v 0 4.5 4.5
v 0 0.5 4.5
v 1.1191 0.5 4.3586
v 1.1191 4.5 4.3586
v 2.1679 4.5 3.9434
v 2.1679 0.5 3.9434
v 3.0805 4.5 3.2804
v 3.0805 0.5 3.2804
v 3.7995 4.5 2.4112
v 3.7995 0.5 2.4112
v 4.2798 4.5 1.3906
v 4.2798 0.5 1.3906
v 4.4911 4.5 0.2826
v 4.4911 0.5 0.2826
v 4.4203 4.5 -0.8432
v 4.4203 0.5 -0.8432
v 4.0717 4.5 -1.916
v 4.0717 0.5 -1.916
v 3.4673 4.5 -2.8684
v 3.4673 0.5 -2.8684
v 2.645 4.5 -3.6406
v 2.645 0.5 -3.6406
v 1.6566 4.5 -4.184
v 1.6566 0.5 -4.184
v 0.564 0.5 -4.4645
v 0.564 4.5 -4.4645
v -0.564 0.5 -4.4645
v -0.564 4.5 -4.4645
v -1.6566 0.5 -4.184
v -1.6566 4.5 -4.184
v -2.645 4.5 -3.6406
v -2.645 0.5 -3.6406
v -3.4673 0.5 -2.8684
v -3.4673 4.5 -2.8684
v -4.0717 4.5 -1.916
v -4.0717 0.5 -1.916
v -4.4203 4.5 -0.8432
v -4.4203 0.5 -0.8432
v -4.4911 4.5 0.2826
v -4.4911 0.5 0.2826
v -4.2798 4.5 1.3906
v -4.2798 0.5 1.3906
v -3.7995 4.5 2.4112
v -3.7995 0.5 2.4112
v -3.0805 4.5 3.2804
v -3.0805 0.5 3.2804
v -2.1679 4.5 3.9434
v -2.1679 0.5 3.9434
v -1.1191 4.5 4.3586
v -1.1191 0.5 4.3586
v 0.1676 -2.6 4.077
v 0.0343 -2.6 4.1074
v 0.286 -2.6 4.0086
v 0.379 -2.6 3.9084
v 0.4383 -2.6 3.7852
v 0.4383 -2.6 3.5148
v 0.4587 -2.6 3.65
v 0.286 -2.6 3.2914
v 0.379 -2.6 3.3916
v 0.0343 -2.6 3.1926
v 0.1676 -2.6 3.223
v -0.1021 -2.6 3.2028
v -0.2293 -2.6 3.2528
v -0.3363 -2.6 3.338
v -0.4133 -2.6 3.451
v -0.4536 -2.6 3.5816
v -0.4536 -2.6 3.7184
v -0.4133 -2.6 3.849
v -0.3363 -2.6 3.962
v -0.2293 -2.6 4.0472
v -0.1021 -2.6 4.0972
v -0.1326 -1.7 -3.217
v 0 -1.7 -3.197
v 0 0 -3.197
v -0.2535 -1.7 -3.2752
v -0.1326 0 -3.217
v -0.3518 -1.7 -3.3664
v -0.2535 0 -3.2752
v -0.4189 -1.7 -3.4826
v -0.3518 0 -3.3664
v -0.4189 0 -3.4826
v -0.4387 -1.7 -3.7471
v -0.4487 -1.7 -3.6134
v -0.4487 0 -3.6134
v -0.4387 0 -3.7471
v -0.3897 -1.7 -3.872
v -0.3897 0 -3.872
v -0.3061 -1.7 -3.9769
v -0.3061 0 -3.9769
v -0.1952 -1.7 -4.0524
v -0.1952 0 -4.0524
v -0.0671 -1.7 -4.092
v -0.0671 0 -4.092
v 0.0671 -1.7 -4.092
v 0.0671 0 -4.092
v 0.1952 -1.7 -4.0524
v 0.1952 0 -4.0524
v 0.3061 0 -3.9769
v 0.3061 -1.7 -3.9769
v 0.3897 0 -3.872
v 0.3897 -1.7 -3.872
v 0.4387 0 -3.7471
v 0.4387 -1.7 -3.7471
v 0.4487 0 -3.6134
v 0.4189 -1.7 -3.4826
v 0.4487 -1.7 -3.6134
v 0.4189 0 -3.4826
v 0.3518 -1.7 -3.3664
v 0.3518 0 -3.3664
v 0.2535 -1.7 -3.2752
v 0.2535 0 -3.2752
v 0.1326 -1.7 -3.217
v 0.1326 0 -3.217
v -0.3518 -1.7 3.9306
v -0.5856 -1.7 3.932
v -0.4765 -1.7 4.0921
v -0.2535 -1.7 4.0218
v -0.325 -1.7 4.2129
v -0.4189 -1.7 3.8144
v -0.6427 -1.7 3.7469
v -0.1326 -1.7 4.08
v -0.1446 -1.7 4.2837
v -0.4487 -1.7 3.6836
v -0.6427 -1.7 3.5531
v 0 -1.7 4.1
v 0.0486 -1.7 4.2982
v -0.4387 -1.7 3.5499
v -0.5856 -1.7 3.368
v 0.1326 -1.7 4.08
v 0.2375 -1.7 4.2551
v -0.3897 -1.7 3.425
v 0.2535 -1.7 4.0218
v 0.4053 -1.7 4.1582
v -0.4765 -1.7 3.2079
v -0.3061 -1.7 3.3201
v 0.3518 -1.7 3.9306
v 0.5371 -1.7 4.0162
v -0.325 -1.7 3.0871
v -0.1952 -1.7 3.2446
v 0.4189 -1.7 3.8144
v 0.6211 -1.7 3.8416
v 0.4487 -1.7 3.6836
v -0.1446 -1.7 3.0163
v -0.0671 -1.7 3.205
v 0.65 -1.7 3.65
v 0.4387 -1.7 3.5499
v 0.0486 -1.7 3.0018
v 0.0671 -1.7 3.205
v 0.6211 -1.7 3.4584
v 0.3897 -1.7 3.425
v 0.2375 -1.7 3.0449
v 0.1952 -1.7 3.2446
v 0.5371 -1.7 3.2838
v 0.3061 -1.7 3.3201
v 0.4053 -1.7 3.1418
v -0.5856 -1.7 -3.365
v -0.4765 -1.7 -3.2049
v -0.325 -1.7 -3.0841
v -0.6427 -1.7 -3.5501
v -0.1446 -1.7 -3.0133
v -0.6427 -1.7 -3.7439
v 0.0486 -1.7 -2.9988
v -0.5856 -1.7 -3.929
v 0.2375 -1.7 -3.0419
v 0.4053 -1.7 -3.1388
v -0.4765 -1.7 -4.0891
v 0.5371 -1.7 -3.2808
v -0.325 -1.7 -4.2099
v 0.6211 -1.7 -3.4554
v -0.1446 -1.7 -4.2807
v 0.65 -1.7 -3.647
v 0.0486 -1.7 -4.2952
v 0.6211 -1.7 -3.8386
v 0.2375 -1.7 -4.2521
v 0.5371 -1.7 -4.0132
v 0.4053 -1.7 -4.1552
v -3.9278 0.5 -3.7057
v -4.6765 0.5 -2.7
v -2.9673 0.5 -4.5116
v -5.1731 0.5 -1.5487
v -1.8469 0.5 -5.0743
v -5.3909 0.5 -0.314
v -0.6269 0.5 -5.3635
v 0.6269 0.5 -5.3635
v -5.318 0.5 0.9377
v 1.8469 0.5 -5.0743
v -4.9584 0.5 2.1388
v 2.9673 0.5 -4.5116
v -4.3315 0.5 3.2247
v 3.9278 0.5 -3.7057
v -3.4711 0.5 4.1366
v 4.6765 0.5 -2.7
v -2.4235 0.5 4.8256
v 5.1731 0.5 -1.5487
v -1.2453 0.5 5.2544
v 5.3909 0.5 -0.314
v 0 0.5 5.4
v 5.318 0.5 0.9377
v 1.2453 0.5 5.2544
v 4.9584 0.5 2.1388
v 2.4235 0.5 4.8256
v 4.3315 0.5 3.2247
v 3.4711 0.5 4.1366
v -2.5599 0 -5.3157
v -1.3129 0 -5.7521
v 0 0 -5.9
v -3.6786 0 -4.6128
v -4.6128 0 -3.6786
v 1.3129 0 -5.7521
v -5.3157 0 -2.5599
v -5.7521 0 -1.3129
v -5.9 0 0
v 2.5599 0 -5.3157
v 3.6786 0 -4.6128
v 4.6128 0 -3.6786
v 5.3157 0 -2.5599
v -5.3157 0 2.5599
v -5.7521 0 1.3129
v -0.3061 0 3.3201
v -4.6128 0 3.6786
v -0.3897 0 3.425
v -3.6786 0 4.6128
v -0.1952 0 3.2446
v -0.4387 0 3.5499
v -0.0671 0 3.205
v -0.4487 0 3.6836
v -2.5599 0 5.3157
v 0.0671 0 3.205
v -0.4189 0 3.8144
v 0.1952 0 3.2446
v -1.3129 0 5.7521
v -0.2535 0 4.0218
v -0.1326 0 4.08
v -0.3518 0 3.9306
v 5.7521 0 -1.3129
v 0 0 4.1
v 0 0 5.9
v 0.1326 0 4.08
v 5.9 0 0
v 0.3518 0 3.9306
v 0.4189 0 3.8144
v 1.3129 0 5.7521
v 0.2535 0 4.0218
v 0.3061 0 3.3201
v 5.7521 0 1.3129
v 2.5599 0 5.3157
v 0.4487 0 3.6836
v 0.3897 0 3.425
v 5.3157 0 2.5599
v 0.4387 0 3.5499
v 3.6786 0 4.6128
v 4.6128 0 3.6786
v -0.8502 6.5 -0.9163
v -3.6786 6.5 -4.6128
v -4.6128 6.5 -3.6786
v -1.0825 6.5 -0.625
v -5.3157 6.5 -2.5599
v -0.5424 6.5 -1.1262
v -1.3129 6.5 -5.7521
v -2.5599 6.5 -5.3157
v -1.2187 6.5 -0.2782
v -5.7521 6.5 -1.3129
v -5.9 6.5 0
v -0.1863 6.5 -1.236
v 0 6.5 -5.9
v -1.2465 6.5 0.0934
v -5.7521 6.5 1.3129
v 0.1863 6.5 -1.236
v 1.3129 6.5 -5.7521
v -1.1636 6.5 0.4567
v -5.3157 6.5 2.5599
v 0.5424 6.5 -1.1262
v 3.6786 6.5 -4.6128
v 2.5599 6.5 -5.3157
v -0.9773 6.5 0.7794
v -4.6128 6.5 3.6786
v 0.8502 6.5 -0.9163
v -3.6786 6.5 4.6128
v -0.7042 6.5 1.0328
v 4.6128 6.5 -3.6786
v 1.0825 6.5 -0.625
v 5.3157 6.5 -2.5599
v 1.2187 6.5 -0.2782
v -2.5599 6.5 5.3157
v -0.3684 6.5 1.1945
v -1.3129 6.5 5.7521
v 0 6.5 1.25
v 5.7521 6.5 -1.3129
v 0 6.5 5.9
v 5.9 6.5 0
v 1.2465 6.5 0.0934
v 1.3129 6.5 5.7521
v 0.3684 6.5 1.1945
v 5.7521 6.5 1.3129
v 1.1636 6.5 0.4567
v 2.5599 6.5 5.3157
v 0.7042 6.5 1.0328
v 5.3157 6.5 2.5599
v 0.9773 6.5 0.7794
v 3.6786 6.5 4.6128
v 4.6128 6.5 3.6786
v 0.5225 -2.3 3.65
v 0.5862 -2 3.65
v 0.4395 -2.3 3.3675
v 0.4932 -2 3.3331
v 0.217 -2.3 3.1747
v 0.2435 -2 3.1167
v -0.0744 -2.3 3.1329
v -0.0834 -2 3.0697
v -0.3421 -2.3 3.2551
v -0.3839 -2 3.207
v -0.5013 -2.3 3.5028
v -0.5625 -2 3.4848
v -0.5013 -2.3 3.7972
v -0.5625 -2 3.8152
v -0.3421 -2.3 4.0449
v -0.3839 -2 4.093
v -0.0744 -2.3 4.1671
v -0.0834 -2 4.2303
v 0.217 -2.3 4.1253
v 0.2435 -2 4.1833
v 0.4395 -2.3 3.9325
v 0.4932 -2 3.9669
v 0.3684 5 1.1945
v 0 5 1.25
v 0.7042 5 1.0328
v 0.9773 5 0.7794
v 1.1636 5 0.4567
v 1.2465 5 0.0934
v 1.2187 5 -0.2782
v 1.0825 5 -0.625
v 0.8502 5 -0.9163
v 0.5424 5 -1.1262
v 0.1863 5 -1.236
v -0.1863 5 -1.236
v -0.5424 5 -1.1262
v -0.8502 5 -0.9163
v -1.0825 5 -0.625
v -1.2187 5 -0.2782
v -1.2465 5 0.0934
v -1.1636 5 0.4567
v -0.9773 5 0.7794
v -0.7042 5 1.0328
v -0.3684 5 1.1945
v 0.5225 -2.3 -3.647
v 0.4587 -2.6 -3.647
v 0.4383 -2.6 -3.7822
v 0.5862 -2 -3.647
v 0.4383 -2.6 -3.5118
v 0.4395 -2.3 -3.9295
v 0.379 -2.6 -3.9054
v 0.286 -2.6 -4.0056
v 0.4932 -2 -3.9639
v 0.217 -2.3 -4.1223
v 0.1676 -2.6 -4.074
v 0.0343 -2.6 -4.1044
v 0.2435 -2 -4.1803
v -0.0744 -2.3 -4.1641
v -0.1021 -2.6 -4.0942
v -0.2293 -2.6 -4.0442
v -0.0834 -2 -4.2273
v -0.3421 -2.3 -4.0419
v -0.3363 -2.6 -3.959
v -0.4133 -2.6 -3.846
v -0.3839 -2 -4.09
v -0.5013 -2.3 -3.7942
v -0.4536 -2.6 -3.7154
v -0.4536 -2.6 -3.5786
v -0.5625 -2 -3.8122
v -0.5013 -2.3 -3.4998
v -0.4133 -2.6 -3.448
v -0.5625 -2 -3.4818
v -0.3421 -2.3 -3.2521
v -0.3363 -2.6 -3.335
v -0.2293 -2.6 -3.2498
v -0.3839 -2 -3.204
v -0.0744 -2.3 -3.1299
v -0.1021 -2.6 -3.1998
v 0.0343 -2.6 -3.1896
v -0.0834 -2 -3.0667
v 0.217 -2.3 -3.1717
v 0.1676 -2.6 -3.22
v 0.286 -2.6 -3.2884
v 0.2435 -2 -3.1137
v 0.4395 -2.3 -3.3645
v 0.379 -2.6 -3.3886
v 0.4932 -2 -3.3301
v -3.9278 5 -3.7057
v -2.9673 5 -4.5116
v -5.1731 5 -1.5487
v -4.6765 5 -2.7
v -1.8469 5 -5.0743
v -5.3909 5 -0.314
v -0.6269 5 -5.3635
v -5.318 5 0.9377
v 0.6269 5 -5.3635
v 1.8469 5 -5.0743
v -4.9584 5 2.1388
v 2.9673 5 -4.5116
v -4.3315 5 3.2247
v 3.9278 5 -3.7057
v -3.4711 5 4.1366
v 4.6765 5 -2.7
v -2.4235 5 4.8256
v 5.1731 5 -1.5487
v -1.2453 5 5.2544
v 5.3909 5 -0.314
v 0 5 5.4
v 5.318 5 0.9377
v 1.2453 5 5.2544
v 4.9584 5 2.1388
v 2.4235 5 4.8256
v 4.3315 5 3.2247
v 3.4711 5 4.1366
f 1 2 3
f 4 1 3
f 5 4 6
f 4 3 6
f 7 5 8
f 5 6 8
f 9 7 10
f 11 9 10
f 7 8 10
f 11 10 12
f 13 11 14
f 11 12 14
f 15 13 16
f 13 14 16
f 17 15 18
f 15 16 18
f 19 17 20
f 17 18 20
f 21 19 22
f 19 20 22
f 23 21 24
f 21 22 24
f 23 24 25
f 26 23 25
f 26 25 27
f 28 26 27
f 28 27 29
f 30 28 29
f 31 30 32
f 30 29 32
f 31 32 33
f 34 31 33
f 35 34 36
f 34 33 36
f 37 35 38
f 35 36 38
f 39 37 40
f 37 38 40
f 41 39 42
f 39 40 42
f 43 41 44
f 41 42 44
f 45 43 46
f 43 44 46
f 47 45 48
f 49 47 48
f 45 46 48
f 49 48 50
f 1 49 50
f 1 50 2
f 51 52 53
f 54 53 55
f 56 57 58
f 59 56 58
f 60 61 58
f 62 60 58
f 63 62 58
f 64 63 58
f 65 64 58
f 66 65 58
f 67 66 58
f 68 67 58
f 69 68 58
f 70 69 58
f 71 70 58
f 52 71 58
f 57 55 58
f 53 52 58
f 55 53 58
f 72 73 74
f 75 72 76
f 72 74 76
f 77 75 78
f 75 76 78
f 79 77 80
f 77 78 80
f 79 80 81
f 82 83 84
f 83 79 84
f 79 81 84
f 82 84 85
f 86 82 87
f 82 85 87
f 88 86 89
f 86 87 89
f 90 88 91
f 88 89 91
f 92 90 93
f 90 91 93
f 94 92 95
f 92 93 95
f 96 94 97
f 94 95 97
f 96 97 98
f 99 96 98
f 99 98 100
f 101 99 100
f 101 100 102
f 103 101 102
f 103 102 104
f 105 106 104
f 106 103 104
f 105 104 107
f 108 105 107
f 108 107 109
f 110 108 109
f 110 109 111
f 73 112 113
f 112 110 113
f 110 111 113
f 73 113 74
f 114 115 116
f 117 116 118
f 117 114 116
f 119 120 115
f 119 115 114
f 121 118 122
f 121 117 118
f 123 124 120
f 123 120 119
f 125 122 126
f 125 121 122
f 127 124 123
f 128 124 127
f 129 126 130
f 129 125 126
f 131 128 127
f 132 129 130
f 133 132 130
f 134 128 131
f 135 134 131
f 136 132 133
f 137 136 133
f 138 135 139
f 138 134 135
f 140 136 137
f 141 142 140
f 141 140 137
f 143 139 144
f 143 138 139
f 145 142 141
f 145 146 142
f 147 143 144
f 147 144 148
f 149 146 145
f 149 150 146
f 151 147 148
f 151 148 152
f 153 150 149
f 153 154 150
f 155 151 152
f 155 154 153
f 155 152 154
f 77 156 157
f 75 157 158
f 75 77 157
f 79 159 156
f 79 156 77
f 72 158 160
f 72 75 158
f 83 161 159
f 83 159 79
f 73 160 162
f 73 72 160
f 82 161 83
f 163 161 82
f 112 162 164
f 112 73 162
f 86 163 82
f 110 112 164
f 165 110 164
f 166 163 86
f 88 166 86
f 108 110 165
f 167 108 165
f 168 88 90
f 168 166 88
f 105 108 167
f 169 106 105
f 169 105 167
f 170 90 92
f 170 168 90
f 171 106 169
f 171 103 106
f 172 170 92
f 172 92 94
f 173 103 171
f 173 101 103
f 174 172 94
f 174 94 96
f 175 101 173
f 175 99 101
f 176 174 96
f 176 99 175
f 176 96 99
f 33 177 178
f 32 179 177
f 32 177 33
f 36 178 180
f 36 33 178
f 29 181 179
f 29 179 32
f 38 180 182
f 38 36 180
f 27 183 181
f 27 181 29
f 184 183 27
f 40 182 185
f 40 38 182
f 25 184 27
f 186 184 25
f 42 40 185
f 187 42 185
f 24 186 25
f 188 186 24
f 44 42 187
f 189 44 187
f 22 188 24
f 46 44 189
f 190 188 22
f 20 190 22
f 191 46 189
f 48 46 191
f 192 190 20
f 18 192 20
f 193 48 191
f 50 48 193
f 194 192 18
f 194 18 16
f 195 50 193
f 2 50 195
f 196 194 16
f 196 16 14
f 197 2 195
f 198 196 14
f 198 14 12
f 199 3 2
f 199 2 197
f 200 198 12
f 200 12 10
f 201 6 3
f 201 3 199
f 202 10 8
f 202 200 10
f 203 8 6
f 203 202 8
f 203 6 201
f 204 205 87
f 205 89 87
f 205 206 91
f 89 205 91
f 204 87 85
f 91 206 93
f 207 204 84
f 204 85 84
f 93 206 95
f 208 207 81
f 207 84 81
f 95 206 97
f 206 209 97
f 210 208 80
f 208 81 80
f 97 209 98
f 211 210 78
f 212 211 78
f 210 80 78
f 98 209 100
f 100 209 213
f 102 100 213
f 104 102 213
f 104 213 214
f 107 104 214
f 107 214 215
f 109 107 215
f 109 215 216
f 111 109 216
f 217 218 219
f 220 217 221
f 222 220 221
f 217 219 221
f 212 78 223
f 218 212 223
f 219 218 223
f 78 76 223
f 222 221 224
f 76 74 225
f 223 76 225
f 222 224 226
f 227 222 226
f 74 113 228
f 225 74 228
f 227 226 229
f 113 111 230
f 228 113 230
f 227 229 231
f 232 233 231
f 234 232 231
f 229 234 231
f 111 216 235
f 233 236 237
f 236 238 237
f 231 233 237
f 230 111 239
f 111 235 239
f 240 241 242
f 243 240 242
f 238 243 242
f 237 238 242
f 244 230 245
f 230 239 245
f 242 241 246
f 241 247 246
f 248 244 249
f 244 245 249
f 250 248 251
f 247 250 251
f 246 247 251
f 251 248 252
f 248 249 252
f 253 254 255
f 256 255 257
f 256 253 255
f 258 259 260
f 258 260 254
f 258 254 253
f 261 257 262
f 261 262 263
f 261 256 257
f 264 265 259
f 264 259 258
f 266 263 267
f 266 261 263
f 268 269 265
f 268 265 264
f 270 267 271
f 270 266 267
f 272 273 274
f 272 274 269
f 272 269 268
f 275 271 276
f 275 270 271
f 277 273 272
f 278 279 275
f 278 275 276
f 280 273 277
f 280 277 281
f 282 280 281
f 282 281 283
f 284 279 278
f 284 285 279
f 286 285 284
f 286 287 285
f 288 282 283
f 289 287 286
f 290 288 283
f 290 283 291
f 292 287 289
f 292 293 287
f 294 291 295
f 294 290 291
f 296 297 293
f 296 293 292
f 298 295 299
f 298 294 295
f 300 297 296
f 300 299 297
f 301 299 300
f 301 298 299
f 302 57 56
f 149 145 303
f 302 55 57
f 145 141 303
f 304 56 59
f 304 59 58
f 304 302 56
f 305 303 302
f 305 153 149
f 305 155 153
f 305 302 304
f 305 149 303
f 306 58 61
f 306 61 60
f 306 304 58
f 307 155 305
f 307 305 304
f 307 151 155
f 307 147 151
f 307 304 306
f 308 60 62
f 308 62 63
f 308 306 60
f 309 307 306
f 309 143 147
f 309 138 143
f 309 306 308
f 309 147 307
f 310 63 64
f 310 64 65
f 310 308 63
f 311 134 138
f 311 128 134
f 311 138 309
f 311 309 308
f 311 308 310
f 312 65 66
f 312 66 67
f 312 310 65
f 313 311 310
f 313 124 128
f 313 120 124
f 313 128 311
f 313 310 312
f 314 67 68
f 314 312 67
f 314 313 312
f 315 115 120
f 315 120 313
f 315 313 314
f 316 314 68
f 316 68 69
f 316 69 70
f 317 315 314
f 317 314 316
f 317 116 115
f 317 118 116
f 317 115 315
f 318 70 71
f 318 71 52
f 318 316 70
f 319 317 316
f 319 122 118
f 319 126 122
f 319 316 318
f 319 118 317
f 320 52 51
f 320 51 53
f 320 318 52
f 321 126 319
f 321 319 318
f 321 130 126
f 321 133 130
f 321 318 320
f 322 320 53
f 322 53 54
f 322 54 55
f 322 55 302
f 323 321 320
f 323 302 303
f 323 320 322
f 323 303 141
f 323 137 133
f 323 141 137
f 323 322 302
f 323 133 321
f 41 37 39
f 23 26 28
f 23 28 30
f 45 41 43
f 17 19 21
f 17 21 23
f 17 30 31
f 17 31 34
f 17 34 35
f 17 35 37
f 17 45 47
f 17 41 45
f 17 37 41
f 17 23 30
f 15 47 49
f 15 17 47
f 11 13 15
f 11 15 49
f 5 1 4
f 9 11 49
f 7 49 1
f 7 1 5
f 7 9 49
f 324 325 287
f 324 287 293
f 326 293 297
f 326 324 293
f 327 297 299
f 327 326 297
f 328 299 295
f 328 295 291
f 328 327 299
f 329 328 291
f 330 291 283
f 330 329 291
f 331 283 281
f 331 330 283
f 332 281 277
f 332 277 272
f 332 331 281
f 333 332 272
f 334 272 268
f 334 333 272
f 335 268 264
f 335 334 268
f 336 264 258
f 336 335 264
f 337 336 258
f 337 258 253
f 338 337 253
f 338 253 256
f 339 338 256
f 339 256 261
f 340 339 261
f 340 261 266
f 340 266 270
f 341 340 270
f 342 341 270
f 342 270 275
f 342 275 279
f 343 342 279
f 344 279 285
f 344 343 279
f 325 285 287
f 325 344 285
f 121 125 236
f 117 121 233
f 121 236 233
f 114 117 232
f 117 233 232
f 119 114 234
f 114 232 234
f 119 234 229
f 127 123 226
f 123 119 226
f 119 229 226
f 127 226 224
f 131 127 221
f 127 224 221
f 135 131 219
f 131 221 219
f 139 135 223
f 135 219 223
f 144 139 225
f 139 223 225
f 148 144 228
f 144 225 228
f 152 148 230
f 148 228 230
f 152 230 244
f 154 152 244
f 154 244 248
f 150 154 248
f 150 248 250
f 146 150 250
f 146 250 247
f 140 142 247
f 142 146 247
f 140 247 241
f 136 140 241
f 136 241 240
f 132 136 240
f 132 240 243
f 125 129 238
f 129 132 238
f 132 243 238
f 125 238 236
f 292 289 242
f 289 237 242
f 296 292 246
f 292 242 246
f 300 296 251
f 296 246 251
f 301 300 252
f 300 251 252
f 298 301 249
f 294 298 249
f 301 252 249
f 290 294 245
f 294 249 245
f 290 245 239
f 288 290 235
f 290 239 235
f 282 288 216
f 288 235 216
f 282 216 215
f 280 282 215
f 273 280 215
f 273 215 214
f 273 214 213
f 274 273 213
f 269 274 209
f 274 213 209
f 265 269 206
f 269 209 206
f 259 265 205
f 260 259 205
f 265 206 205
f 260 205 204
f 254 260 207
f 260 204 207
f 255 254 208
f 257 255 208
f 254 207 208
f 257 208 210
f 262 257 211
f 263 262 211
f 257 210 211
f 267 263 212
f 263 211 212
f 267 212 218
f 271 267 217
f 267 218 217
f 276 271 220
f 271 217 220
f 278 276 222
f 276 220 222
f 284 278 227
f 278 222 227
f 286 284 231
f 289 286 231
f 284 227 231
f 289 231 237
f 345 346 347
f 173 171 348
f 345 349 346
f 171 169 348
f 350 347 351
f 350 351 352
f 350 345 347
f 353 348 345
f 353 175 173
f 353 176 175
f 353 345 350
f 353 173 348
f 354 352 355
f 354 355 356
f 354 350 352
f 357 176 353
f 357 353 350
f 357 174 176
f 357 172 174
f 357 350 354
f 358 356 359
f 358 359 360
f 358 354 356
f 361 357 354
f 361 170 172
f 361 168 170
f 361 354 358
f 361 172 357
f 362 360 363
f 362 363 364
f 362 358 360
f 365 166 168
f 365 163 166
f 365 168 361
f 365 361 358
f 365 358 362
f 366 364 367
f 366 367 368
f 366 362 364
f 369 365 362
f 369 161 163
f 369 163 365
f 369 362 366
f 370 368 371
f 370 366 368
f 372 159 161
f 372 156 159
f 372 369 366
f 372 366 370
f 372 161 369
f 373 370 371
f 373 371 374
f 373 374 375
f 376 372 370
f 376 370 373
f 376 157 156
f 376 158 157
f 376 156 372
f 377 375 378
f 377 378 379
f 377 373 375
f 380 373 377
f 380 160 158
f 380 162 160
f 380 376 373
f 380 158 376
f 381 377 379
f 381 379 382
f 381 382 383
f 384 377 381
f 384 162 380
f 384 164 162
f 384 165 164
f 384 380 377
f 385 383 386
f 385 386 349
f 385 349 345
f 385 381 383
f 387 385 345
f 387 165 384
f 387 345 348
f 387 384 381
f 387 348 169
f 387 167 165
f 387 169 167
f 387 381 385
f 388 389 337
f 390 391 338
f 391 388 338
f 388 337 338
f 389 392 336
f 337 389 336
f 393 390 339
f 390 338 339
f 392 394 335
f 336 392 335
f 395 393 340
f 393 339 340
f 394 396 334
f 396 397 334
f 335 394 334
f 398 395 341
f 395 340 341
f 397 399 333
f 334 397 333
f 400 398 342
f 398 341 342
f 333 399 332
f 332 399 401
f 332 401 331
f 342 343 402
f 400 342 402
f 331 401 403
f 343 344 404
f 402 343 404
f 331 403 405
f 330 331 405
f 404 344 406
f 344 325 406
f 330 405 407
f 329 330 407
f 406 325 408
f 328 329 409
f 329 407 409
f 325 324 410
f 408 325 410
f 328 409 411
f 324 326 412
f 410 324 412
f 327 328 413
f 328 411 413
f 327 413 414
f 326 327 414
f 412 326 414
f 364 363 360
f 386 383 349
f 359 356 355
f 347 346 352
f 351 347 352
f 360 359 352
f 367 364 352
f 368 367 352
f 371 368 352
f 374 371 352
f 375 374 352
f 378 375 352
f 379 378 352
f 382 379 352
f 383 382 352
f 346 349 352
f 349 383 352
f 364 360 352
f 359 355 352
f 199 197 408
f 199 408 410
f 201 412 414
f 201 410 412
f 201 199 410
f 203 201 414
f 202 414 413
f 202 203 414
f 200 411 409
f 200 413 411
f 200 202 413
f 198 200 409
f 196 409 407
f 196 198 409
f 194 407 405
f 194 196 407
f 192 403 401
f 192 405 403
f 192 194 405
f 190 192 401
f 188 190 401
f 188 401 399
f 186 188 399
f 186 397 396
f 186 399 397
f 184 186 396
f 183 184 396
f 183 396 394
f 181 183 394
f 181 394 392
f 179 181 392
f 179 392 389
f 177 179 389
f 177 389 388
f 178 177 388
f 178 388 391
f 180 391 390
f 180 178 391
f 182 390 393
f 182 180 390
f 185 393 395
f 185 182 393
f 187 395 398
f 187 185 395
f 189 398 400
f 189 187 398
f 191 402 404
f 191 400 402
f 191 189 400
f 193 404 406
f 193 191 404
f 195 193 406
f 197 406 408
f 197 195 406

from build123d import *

# Parameters (mm, degrees)
ESQUISSE1_R                  = 5.9
BOSS_EXTRU_1_DEPTH           = 5
COQUE1_T                     = -0.5
ESQUISSE2_R                  = 5.9
ESQUISSE2_R_2                = 1.25
BOSS_EXTRU_2_DEPTH           = 1.5
ESQUISSE3_R                  = 4.5
BOSS_EXTRU_3_DEPTH           = 4
ESQUISSE4_R                  = 0.45
BOSS_EXTRU_4_DEPTH           = 2.6
ESQUISSE5_R                  = 0.65
BOSS_EXTRU_5_DEPTH           = 0.9
BOSS_EXTRU_5_DRAFT           = -12
BOSS_EXTRU_5_PROFILE_2_DEPTH = 0.9
BOSS_EXTRU_5_PROFILE_2_DRAFT = -12


with BuildPart() as part:
    # Esquisse1 → Boss.-Extru.1 (new body)
    with BuildSketch(Plane(origin=(0, 0, 0), x_dir=(1, 0, 0), z_dir=(0, 1, 0))):
        with Locations(Location((0, 0, 0), (0, 0, 270))):
            Circle(ESQUISSE1_R)
    extrude(amount=BOSS_EXTRU_1_DEPTH)

    # Coque1
    coque1_openings = [part.faces().sort_by_distance(p)[0] for p in [
        (0, 5, 0),
    ]]
    offset(amount=COQUE1_T, openings=coque1_openings, kind=Kind.INTERSECTION)

    # Esquisse2 → Boss.-Extru.2 (add)
    with BuildSketch(Plane(origin=(0, 5, 0), x_dir=(1, 0, 0), z_dir=(0, 1, 0))):
        with Locations(Location((0, 0, 0), (0, 0, 270))):
            Circle(ESQUISSE2_R)
        with Locations(Location((0, 0, 0), (0, 0, 270))):
            Circle(ESQUISSE2_R_2, mode=Mode.SUBTRACT)
    extrude(amount=BOSS_EXTRU_2_DEPTH)

    # Esquisse3 → Boss.-Extru.3 (add)
    with BuildSketch(Plane(origin=(0, 0.5, 0), x_dir=(1, 0, 0), z_dir=(0, 1, 0))):
        with Locations(Location((0, 0, 0), (0, 0, 270))):
            Circle(ESQUISSE3_R)
    extrude(amount=BOSS_EXTRU_3_DEPTH)

    # Esquisse4 → Boss.-Extru.4 (add)
    with BuildSketch(Plane.XZ):
        with Locations(Location((0, 3.65, 0), (0, 0, 90))):
            Circle(ESQUISSE4_R)
        with Locations(Location((0, -3.647, 0), (0, 0, 90))):
            Circle(ESQUISSE4_R)
    extrude(amount=BOSS_EXTRU_4_DEPTH)


with BuildPart() as boss_extru_5_tool:
    # Esquisse5 → Boss.-Extru.5 (with draft: the straight prism first)
    with BuildSketch(Plane(origin=(0, -1.7, 0), x_dir=(1, 0, 0), z_dir=(0, 1, 0))):
        with Locations((0, -3.65)):
            Circle(ESQUISSE5_R)
    extrude(amount=-BOSS_EXTRU_5_DEPTH)
    # Boss.-Extru.5: the draft: its side faces are tilted about the plane it starts from
    boss_extru_5_sides = [boss_extru_5_tool.faces().sort_by_distance(p)[0] for p in [
        (-0.65, -2.15, 3.65),
    ]]
    draft(boss_extru_5_sides, Plane(origin=(0, -1.7, 0), x_dir=(1, 0, 0), z_dir=(0, 1, 0)), BOSS_EXTRU_5_DRAFT)


with BuildPart() as part_1:
    add(part.part)

    # Boss.-Extru.5: add boss_extru_5_tool
    add(boss_extru_5_tool.part)


with BuildPart() as boss_extru_5_profile_2_tool:
    # Esquisse5 → Boss.-Extru.5 profile 2 (with draft: the straight prism first)
    with BuildSketch(Plane(origin=(0, -1.7, 0), x_dir=(1, 0, 0), z_dir=(0, 1, 0))):
        with Locations((0, 3.647)):
            Circle(ESQUISSE5_R)
    extrude(amount=-BOSS_EXTRU_5_PROFILE_2_DEPTH)
    # Boss.-Extru.5 profile 2: the draft: its side faces are tilted about the plane it starts from
    boss_extru_5_profile_2_sides = [boss_extru_5_profile_2_tool.faces().sort_by_distance(p)[0] for p in [
        (-0.65, -2.15, -3.647),
    ]]
    draft(boss_extru_5_profile_2_sides, Plane(origin=(0, -1.7, 0), x_dir=(1, 0, 0), z_dir=(0, 1, 0)), BOSS_EXTRU_5_PROFILE_2_DRAFT)


with BuildPart() as part_2:
    add(part_1.part)

    # Boss.-Extru.5 profile 2: add boss_extru_5_profile_2_tool
    add(boss_extru_5_profile_2_tool.part)


solid = part_2.part
